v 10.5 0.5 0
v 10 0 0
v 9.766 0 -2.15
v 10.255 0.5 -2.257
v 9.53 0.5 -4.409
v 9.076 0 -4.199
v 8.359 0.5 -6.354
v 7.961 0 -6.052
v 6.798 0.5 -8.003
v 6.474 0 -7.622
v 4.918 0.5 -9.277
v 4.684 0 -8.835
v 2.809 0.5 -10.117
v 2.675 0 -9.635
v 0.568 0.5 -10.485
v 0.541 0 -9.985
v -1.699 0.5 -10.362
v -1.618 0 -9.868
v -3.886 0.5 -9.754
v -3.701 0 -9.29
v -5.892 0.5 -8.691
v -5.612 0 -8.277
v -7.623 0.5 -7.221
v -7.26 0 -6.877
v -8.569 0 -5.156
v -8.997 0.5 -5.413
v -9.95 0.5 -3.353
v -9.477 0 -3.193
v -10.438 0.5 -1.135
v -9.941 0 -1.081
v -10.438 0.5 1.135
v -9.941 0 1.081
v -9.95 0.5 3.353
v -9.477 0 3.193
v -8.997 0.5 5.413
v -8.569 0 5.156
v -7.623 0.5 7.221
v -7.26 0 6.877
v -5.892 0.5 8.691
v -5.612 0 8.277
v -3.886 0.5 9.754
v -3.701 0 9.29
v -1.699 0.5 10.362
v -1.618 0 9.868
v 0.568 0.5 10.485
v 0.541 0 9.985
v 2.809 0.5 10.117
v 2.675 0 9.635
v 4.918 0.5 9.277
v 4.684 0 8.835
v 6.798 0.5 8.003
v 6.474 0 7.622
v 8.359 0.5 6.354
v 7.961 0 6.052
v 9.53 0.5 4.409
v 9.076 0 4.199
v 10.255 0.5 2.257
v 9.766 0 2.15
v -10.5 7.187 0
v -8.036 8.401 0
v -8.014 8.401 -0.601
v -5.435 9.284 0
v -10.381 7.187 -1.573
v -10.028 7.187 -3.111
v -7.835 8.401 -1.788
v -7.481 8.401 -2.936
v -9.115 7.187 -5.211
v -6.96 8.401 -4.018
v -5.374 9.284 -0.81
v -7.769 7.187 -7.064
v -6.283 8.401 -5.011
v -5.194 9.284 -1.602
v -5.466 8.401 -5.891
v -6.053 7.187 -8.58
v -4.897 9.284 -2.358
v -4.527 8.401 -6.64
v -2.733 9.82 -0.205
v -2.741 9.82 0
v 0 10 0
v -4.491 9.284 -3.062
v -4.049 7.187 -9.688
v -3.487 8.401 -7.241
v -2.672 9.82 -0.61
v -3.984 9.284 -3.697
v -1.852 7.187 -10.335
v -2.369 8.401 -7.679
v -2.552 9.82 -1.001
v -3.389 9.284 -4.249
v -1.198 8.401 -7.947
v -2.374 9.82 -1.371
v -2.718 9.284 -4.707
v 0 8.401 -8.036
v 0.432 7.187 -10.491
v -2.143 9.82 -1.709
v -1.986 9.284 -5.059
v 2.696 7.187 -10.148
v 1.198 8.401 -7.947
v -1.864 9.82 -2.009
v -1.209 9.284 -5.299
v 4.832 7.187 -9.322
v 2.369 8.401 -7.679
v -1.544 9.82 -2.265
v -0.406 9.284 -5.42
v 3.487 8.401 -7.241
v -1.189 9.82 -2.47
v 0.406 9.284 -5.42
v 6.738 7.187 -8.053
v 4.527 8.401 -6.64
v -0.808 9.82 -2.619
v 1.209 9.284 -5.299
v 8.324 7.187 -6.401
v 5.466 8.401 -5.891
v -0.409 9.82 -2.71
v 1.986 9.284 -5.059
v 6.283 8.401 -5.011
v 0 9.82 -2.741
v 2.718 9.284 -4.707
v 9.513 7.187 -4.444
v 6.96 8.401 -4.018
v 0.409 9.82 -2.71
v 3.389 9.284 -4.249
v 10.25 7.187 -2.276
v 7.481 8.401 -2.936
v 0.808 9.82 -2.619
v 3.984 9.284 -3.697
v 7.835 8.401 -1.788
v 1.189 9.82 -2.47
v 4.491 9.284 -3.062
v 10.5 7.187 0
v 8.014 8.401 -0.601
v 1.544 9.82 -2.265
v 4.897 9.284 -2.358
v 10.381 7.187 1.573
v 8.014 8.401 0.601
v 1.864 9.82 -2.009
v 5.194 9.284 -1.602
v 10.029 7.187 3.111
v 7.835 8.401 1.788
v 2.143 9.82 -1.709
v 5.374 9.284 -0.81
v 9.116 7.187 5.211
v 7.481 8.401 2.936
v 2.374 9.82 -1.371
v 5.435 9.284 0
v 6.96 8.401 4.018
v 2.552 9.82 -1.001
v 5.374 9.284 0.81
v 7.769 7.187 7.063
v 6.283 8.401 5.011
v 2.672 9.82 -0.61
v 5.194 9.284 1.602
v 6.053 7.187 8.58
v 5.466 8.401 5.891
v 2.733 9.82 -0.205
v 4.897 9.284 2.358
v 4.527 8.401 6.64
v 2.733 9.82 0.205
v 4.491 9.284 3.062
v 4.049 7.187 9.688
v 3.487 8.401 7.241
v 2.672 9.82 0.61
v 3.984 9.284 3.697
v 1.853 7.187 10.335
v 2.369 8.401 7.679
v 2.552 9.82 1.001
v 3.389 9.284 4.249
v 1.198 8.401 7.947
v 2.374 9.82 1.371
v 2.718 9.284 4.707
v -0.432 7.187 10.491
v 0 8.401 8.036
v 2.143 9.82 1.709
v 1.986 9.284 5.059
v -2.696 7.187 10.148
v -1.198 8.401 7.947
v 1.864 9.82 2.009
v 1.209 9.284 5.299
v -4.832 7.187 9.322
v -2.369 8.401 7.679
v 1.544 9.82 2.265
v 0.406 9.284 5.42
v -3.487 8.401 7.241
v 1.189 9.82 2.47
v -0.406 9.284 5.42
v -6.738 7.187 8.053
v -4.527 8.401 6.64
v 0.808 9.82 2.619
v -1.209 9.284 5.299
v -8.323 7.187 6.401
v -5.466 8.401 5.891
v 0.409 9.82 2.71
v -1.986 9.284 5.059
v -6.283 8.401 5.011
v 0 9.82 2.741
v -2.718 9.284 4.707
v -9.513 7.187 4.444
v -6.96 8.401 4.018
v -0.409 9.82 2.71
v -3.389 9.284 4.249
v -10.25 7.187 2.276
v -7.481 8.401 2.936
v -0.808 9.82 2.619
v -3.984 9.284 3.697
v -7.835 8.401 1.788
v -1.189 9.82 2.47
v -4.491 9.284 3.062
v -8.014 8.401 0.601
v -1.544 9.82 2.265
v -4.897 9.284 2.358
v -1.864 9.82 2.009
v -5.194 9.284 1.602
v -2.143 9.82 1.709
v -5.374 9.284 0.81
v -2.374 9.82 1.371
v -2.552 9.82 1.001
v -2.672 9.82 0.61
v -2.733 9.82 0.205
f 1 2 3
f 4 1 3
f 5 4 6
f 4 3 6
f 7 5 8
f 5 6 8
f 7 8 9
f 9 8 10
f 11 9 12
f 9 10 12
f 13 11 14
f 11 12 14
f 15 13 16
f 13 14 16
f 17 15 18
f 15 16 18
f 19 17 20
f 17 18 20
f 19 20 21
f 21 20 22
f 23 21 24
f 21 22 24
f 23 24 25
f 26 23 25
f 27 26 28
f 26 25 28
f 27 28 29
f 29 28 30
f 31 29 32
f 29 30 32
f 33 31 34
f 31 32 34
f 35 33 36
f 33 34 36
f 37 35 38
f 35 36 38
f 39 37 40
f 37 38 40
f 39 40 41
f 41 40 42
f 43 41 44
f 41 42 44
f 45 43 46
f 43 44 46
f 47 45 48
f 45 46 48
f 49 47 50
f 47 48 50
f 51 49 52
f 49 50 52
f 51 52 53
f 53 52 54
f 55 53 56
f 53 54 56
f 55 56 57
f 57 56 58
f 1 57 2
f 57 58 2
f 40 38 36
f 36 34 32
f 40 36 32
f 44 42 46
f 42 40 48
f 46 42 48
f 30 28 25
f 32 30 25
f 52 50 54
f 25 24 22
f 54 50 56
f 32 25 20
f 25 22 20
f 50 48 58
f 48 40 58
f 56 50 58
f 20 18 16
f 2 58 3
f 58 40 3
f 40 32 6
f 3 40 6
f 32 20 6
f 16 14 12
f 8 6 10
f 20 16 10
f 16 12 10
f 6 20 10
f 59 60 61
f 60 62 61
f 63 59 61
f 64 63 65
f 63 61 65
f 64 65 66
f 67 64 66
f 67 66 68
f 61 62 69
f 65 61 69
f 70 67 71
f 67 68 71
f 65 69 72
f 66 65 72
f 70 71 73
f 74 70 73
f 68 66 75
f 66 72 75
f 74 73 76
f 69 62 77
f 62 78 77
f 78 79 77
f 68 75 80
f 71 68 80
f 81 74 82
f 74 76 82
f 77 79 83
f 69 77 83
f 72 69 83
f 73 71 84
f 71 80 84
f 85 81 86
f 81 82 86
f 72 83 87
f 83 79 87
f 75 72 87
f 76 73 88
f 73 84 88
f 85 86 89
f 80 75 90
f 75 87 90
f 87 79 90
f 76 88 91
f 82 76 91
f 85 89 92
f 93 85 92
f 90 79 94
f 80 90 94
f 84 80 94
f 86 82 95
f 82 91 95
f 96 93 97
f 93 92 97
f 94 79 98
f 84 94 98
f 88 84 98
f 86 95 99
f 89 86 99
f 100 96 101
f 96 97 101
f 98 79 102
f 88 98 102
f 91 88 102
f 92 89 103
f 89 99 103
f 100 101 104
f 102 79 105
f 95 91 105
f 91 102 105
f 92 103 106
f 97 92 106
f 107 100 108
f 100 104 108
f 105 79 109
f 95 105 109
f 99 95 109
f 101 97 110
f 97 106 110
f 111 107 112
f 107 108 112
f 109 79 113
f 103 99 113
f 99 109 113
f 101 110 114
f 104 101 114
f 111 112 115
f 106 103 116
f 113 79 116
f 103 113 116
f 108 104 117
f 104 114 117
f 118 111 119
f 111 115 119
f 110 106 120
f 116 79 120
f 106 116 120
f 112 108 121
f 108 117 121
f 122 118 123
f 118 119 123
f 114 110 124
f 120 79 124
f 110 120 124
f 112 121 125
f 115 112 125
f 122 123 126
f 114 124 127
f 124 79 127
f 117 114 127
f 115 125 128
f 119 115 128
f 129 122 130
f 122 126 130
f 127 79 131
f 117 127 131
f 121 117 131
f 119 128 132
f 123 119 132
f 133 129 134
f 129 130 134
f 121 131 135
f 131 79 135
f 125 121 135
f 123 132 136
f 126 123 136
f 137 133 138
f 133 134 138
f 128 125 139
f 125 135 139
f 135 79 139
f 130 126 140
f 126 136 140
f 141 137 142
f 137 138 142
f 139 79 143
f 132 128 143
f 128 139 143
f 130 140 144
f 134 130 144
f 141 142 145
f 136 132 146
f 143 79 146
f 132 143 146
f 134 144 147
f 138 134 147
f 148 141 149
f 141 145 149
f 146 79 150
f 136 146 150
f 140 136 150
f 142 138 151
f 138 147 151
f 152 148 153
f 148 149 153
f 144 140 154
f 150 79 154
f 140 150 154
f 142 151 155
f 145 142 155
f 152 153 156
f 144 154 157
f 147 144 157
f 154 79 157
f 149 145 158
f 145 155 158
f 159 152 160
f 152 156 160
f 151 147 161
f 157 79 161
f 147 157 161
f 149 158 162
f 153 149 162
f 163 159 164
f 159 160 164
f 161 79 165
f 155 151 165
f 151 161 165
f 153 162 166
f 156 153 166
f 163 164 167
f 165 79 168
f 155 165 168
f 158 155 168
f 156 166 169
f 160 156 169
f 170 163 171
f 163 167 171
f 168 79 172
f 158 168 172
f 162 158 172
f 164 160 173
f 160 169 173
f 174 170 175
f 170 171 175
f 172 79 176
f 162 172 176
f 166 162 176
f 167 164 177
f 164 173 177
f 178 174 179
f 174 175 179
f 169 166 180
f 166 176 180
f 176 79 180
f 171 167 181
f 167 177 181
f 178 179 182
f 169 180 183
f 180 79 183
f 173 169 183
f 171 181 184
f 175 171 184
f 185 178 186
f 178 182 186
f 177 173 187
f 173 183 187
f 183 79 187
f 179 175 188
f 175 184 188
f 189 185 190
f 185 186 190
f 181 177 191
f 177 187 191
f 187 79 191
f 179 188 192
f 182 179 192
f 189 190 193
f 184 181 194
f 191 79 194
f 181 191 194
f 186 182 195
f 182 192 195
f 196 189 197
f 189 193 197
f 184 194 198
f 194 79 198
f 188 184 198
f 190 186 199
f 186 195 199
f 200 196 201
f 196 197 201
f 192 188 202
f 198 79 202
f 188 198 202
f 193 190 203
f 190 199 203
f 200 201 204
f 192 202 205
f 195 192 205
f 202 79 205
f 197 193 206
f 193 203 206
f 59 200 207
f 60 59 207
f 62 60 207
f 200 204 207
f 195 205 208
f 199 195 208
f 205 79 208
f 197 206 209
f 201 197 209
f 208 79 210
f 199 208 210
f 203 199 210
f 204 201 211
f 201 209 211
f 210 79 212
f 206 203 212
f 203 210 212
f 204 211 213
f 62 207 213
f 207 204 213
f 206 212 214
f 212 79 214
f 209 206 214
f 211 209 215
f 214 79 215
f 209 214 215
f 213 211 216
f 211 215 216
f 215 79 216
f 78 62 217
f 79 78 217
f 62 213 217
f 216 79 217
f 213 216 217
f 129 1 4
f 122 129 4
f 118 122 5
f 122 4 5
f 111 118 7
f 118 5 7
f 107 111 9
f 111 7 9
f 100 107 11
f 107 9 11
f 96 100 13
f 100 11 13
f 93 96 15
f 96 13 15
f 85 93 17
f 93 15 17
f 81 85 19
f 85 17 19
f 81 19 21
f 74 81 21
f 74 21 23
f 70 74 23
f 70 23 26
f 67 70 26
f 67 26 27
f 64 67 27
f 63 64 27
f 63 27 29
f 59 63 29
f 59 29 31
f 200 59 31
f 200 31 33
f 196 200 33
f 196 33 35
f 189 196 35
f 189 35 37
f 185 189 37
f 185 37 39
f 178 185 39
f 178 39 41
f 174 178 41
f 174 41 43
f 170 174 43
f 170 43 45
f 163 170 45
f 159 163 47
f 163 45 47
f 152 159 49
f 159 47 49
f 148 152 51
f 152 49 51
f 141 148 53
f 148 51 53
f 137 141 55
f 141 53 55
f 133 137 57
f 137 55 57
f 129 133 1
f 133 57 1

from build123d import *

# Parameters (mm, degrees)
SKETCH2_R               = 21
SKETCH2_R_2             = 10.5
CUT_EXTRUDE1_DEPTH      = 11
CUT_EXTRUDE1_DEPTH_BACK = 12
SKETCH2_5_R             = 10.5
CUT_EXTRUDE2_DEPTH      = 12
CHAMFER1_SIZE           = 0.5


with BuildPart() as part:
    # Sketch1 → Revolve1 (revolve)
    with BuildSketch(Plane.XY):
        with BuildLine():
            Line((0, 10), (0, -11))
            Line((0, -11), (-21, -11))
            ThreePointArc((-21, -11), (-14.849242405, 3.849242405), (0, 10))
        make_face()
    revolve(axis=Axis((0, 10, 0), (0, -1, 0)))

    # Sketch2 → Cut-Extrude1 (cut, two sides)
    with BuildSketch(Plane(origin=(0, 0, 0), x_dir=(1, 0, 0), z_dir=(0, 1, 0))) as cut_extrude1_sk:
        Circle(SKETCH2_R)
        Circle(SKETCH2_R_2, mode=Mode.SUBTRACT)
    extrude(amount=CUT_EXTRUDE1_DEPTH, mode=Mode.SUBTRACT)
    extrude(cut_extrude1_sk.sketch, amount=-CUT_EXTRUDE1_DEPTH_BACK, mode=Mode.SUBTRACT)

    # Sketch2<5> → Cut-Extrude2 (cut, through all)
    with BuildSketch(Plane(origin=(0, 0, 0), x_dir=(1, 0, 0), z_dir=(0, 1, 0))):
        Circle(SKETCH2_5_R)
    extrude(amount=-CUT_EXTRUDE2_DEPTH, mode=Mode.SUBTRACT)

    # Chamfer1
    chamfer1_edges = [part.edges().sort_by_distance(p)[0] for p in [
        (-10.5, 0, 0),
    ]]
    chamfer(chamfer1_edges, length=CHAMFER1_SIZE)


solid = part.part
